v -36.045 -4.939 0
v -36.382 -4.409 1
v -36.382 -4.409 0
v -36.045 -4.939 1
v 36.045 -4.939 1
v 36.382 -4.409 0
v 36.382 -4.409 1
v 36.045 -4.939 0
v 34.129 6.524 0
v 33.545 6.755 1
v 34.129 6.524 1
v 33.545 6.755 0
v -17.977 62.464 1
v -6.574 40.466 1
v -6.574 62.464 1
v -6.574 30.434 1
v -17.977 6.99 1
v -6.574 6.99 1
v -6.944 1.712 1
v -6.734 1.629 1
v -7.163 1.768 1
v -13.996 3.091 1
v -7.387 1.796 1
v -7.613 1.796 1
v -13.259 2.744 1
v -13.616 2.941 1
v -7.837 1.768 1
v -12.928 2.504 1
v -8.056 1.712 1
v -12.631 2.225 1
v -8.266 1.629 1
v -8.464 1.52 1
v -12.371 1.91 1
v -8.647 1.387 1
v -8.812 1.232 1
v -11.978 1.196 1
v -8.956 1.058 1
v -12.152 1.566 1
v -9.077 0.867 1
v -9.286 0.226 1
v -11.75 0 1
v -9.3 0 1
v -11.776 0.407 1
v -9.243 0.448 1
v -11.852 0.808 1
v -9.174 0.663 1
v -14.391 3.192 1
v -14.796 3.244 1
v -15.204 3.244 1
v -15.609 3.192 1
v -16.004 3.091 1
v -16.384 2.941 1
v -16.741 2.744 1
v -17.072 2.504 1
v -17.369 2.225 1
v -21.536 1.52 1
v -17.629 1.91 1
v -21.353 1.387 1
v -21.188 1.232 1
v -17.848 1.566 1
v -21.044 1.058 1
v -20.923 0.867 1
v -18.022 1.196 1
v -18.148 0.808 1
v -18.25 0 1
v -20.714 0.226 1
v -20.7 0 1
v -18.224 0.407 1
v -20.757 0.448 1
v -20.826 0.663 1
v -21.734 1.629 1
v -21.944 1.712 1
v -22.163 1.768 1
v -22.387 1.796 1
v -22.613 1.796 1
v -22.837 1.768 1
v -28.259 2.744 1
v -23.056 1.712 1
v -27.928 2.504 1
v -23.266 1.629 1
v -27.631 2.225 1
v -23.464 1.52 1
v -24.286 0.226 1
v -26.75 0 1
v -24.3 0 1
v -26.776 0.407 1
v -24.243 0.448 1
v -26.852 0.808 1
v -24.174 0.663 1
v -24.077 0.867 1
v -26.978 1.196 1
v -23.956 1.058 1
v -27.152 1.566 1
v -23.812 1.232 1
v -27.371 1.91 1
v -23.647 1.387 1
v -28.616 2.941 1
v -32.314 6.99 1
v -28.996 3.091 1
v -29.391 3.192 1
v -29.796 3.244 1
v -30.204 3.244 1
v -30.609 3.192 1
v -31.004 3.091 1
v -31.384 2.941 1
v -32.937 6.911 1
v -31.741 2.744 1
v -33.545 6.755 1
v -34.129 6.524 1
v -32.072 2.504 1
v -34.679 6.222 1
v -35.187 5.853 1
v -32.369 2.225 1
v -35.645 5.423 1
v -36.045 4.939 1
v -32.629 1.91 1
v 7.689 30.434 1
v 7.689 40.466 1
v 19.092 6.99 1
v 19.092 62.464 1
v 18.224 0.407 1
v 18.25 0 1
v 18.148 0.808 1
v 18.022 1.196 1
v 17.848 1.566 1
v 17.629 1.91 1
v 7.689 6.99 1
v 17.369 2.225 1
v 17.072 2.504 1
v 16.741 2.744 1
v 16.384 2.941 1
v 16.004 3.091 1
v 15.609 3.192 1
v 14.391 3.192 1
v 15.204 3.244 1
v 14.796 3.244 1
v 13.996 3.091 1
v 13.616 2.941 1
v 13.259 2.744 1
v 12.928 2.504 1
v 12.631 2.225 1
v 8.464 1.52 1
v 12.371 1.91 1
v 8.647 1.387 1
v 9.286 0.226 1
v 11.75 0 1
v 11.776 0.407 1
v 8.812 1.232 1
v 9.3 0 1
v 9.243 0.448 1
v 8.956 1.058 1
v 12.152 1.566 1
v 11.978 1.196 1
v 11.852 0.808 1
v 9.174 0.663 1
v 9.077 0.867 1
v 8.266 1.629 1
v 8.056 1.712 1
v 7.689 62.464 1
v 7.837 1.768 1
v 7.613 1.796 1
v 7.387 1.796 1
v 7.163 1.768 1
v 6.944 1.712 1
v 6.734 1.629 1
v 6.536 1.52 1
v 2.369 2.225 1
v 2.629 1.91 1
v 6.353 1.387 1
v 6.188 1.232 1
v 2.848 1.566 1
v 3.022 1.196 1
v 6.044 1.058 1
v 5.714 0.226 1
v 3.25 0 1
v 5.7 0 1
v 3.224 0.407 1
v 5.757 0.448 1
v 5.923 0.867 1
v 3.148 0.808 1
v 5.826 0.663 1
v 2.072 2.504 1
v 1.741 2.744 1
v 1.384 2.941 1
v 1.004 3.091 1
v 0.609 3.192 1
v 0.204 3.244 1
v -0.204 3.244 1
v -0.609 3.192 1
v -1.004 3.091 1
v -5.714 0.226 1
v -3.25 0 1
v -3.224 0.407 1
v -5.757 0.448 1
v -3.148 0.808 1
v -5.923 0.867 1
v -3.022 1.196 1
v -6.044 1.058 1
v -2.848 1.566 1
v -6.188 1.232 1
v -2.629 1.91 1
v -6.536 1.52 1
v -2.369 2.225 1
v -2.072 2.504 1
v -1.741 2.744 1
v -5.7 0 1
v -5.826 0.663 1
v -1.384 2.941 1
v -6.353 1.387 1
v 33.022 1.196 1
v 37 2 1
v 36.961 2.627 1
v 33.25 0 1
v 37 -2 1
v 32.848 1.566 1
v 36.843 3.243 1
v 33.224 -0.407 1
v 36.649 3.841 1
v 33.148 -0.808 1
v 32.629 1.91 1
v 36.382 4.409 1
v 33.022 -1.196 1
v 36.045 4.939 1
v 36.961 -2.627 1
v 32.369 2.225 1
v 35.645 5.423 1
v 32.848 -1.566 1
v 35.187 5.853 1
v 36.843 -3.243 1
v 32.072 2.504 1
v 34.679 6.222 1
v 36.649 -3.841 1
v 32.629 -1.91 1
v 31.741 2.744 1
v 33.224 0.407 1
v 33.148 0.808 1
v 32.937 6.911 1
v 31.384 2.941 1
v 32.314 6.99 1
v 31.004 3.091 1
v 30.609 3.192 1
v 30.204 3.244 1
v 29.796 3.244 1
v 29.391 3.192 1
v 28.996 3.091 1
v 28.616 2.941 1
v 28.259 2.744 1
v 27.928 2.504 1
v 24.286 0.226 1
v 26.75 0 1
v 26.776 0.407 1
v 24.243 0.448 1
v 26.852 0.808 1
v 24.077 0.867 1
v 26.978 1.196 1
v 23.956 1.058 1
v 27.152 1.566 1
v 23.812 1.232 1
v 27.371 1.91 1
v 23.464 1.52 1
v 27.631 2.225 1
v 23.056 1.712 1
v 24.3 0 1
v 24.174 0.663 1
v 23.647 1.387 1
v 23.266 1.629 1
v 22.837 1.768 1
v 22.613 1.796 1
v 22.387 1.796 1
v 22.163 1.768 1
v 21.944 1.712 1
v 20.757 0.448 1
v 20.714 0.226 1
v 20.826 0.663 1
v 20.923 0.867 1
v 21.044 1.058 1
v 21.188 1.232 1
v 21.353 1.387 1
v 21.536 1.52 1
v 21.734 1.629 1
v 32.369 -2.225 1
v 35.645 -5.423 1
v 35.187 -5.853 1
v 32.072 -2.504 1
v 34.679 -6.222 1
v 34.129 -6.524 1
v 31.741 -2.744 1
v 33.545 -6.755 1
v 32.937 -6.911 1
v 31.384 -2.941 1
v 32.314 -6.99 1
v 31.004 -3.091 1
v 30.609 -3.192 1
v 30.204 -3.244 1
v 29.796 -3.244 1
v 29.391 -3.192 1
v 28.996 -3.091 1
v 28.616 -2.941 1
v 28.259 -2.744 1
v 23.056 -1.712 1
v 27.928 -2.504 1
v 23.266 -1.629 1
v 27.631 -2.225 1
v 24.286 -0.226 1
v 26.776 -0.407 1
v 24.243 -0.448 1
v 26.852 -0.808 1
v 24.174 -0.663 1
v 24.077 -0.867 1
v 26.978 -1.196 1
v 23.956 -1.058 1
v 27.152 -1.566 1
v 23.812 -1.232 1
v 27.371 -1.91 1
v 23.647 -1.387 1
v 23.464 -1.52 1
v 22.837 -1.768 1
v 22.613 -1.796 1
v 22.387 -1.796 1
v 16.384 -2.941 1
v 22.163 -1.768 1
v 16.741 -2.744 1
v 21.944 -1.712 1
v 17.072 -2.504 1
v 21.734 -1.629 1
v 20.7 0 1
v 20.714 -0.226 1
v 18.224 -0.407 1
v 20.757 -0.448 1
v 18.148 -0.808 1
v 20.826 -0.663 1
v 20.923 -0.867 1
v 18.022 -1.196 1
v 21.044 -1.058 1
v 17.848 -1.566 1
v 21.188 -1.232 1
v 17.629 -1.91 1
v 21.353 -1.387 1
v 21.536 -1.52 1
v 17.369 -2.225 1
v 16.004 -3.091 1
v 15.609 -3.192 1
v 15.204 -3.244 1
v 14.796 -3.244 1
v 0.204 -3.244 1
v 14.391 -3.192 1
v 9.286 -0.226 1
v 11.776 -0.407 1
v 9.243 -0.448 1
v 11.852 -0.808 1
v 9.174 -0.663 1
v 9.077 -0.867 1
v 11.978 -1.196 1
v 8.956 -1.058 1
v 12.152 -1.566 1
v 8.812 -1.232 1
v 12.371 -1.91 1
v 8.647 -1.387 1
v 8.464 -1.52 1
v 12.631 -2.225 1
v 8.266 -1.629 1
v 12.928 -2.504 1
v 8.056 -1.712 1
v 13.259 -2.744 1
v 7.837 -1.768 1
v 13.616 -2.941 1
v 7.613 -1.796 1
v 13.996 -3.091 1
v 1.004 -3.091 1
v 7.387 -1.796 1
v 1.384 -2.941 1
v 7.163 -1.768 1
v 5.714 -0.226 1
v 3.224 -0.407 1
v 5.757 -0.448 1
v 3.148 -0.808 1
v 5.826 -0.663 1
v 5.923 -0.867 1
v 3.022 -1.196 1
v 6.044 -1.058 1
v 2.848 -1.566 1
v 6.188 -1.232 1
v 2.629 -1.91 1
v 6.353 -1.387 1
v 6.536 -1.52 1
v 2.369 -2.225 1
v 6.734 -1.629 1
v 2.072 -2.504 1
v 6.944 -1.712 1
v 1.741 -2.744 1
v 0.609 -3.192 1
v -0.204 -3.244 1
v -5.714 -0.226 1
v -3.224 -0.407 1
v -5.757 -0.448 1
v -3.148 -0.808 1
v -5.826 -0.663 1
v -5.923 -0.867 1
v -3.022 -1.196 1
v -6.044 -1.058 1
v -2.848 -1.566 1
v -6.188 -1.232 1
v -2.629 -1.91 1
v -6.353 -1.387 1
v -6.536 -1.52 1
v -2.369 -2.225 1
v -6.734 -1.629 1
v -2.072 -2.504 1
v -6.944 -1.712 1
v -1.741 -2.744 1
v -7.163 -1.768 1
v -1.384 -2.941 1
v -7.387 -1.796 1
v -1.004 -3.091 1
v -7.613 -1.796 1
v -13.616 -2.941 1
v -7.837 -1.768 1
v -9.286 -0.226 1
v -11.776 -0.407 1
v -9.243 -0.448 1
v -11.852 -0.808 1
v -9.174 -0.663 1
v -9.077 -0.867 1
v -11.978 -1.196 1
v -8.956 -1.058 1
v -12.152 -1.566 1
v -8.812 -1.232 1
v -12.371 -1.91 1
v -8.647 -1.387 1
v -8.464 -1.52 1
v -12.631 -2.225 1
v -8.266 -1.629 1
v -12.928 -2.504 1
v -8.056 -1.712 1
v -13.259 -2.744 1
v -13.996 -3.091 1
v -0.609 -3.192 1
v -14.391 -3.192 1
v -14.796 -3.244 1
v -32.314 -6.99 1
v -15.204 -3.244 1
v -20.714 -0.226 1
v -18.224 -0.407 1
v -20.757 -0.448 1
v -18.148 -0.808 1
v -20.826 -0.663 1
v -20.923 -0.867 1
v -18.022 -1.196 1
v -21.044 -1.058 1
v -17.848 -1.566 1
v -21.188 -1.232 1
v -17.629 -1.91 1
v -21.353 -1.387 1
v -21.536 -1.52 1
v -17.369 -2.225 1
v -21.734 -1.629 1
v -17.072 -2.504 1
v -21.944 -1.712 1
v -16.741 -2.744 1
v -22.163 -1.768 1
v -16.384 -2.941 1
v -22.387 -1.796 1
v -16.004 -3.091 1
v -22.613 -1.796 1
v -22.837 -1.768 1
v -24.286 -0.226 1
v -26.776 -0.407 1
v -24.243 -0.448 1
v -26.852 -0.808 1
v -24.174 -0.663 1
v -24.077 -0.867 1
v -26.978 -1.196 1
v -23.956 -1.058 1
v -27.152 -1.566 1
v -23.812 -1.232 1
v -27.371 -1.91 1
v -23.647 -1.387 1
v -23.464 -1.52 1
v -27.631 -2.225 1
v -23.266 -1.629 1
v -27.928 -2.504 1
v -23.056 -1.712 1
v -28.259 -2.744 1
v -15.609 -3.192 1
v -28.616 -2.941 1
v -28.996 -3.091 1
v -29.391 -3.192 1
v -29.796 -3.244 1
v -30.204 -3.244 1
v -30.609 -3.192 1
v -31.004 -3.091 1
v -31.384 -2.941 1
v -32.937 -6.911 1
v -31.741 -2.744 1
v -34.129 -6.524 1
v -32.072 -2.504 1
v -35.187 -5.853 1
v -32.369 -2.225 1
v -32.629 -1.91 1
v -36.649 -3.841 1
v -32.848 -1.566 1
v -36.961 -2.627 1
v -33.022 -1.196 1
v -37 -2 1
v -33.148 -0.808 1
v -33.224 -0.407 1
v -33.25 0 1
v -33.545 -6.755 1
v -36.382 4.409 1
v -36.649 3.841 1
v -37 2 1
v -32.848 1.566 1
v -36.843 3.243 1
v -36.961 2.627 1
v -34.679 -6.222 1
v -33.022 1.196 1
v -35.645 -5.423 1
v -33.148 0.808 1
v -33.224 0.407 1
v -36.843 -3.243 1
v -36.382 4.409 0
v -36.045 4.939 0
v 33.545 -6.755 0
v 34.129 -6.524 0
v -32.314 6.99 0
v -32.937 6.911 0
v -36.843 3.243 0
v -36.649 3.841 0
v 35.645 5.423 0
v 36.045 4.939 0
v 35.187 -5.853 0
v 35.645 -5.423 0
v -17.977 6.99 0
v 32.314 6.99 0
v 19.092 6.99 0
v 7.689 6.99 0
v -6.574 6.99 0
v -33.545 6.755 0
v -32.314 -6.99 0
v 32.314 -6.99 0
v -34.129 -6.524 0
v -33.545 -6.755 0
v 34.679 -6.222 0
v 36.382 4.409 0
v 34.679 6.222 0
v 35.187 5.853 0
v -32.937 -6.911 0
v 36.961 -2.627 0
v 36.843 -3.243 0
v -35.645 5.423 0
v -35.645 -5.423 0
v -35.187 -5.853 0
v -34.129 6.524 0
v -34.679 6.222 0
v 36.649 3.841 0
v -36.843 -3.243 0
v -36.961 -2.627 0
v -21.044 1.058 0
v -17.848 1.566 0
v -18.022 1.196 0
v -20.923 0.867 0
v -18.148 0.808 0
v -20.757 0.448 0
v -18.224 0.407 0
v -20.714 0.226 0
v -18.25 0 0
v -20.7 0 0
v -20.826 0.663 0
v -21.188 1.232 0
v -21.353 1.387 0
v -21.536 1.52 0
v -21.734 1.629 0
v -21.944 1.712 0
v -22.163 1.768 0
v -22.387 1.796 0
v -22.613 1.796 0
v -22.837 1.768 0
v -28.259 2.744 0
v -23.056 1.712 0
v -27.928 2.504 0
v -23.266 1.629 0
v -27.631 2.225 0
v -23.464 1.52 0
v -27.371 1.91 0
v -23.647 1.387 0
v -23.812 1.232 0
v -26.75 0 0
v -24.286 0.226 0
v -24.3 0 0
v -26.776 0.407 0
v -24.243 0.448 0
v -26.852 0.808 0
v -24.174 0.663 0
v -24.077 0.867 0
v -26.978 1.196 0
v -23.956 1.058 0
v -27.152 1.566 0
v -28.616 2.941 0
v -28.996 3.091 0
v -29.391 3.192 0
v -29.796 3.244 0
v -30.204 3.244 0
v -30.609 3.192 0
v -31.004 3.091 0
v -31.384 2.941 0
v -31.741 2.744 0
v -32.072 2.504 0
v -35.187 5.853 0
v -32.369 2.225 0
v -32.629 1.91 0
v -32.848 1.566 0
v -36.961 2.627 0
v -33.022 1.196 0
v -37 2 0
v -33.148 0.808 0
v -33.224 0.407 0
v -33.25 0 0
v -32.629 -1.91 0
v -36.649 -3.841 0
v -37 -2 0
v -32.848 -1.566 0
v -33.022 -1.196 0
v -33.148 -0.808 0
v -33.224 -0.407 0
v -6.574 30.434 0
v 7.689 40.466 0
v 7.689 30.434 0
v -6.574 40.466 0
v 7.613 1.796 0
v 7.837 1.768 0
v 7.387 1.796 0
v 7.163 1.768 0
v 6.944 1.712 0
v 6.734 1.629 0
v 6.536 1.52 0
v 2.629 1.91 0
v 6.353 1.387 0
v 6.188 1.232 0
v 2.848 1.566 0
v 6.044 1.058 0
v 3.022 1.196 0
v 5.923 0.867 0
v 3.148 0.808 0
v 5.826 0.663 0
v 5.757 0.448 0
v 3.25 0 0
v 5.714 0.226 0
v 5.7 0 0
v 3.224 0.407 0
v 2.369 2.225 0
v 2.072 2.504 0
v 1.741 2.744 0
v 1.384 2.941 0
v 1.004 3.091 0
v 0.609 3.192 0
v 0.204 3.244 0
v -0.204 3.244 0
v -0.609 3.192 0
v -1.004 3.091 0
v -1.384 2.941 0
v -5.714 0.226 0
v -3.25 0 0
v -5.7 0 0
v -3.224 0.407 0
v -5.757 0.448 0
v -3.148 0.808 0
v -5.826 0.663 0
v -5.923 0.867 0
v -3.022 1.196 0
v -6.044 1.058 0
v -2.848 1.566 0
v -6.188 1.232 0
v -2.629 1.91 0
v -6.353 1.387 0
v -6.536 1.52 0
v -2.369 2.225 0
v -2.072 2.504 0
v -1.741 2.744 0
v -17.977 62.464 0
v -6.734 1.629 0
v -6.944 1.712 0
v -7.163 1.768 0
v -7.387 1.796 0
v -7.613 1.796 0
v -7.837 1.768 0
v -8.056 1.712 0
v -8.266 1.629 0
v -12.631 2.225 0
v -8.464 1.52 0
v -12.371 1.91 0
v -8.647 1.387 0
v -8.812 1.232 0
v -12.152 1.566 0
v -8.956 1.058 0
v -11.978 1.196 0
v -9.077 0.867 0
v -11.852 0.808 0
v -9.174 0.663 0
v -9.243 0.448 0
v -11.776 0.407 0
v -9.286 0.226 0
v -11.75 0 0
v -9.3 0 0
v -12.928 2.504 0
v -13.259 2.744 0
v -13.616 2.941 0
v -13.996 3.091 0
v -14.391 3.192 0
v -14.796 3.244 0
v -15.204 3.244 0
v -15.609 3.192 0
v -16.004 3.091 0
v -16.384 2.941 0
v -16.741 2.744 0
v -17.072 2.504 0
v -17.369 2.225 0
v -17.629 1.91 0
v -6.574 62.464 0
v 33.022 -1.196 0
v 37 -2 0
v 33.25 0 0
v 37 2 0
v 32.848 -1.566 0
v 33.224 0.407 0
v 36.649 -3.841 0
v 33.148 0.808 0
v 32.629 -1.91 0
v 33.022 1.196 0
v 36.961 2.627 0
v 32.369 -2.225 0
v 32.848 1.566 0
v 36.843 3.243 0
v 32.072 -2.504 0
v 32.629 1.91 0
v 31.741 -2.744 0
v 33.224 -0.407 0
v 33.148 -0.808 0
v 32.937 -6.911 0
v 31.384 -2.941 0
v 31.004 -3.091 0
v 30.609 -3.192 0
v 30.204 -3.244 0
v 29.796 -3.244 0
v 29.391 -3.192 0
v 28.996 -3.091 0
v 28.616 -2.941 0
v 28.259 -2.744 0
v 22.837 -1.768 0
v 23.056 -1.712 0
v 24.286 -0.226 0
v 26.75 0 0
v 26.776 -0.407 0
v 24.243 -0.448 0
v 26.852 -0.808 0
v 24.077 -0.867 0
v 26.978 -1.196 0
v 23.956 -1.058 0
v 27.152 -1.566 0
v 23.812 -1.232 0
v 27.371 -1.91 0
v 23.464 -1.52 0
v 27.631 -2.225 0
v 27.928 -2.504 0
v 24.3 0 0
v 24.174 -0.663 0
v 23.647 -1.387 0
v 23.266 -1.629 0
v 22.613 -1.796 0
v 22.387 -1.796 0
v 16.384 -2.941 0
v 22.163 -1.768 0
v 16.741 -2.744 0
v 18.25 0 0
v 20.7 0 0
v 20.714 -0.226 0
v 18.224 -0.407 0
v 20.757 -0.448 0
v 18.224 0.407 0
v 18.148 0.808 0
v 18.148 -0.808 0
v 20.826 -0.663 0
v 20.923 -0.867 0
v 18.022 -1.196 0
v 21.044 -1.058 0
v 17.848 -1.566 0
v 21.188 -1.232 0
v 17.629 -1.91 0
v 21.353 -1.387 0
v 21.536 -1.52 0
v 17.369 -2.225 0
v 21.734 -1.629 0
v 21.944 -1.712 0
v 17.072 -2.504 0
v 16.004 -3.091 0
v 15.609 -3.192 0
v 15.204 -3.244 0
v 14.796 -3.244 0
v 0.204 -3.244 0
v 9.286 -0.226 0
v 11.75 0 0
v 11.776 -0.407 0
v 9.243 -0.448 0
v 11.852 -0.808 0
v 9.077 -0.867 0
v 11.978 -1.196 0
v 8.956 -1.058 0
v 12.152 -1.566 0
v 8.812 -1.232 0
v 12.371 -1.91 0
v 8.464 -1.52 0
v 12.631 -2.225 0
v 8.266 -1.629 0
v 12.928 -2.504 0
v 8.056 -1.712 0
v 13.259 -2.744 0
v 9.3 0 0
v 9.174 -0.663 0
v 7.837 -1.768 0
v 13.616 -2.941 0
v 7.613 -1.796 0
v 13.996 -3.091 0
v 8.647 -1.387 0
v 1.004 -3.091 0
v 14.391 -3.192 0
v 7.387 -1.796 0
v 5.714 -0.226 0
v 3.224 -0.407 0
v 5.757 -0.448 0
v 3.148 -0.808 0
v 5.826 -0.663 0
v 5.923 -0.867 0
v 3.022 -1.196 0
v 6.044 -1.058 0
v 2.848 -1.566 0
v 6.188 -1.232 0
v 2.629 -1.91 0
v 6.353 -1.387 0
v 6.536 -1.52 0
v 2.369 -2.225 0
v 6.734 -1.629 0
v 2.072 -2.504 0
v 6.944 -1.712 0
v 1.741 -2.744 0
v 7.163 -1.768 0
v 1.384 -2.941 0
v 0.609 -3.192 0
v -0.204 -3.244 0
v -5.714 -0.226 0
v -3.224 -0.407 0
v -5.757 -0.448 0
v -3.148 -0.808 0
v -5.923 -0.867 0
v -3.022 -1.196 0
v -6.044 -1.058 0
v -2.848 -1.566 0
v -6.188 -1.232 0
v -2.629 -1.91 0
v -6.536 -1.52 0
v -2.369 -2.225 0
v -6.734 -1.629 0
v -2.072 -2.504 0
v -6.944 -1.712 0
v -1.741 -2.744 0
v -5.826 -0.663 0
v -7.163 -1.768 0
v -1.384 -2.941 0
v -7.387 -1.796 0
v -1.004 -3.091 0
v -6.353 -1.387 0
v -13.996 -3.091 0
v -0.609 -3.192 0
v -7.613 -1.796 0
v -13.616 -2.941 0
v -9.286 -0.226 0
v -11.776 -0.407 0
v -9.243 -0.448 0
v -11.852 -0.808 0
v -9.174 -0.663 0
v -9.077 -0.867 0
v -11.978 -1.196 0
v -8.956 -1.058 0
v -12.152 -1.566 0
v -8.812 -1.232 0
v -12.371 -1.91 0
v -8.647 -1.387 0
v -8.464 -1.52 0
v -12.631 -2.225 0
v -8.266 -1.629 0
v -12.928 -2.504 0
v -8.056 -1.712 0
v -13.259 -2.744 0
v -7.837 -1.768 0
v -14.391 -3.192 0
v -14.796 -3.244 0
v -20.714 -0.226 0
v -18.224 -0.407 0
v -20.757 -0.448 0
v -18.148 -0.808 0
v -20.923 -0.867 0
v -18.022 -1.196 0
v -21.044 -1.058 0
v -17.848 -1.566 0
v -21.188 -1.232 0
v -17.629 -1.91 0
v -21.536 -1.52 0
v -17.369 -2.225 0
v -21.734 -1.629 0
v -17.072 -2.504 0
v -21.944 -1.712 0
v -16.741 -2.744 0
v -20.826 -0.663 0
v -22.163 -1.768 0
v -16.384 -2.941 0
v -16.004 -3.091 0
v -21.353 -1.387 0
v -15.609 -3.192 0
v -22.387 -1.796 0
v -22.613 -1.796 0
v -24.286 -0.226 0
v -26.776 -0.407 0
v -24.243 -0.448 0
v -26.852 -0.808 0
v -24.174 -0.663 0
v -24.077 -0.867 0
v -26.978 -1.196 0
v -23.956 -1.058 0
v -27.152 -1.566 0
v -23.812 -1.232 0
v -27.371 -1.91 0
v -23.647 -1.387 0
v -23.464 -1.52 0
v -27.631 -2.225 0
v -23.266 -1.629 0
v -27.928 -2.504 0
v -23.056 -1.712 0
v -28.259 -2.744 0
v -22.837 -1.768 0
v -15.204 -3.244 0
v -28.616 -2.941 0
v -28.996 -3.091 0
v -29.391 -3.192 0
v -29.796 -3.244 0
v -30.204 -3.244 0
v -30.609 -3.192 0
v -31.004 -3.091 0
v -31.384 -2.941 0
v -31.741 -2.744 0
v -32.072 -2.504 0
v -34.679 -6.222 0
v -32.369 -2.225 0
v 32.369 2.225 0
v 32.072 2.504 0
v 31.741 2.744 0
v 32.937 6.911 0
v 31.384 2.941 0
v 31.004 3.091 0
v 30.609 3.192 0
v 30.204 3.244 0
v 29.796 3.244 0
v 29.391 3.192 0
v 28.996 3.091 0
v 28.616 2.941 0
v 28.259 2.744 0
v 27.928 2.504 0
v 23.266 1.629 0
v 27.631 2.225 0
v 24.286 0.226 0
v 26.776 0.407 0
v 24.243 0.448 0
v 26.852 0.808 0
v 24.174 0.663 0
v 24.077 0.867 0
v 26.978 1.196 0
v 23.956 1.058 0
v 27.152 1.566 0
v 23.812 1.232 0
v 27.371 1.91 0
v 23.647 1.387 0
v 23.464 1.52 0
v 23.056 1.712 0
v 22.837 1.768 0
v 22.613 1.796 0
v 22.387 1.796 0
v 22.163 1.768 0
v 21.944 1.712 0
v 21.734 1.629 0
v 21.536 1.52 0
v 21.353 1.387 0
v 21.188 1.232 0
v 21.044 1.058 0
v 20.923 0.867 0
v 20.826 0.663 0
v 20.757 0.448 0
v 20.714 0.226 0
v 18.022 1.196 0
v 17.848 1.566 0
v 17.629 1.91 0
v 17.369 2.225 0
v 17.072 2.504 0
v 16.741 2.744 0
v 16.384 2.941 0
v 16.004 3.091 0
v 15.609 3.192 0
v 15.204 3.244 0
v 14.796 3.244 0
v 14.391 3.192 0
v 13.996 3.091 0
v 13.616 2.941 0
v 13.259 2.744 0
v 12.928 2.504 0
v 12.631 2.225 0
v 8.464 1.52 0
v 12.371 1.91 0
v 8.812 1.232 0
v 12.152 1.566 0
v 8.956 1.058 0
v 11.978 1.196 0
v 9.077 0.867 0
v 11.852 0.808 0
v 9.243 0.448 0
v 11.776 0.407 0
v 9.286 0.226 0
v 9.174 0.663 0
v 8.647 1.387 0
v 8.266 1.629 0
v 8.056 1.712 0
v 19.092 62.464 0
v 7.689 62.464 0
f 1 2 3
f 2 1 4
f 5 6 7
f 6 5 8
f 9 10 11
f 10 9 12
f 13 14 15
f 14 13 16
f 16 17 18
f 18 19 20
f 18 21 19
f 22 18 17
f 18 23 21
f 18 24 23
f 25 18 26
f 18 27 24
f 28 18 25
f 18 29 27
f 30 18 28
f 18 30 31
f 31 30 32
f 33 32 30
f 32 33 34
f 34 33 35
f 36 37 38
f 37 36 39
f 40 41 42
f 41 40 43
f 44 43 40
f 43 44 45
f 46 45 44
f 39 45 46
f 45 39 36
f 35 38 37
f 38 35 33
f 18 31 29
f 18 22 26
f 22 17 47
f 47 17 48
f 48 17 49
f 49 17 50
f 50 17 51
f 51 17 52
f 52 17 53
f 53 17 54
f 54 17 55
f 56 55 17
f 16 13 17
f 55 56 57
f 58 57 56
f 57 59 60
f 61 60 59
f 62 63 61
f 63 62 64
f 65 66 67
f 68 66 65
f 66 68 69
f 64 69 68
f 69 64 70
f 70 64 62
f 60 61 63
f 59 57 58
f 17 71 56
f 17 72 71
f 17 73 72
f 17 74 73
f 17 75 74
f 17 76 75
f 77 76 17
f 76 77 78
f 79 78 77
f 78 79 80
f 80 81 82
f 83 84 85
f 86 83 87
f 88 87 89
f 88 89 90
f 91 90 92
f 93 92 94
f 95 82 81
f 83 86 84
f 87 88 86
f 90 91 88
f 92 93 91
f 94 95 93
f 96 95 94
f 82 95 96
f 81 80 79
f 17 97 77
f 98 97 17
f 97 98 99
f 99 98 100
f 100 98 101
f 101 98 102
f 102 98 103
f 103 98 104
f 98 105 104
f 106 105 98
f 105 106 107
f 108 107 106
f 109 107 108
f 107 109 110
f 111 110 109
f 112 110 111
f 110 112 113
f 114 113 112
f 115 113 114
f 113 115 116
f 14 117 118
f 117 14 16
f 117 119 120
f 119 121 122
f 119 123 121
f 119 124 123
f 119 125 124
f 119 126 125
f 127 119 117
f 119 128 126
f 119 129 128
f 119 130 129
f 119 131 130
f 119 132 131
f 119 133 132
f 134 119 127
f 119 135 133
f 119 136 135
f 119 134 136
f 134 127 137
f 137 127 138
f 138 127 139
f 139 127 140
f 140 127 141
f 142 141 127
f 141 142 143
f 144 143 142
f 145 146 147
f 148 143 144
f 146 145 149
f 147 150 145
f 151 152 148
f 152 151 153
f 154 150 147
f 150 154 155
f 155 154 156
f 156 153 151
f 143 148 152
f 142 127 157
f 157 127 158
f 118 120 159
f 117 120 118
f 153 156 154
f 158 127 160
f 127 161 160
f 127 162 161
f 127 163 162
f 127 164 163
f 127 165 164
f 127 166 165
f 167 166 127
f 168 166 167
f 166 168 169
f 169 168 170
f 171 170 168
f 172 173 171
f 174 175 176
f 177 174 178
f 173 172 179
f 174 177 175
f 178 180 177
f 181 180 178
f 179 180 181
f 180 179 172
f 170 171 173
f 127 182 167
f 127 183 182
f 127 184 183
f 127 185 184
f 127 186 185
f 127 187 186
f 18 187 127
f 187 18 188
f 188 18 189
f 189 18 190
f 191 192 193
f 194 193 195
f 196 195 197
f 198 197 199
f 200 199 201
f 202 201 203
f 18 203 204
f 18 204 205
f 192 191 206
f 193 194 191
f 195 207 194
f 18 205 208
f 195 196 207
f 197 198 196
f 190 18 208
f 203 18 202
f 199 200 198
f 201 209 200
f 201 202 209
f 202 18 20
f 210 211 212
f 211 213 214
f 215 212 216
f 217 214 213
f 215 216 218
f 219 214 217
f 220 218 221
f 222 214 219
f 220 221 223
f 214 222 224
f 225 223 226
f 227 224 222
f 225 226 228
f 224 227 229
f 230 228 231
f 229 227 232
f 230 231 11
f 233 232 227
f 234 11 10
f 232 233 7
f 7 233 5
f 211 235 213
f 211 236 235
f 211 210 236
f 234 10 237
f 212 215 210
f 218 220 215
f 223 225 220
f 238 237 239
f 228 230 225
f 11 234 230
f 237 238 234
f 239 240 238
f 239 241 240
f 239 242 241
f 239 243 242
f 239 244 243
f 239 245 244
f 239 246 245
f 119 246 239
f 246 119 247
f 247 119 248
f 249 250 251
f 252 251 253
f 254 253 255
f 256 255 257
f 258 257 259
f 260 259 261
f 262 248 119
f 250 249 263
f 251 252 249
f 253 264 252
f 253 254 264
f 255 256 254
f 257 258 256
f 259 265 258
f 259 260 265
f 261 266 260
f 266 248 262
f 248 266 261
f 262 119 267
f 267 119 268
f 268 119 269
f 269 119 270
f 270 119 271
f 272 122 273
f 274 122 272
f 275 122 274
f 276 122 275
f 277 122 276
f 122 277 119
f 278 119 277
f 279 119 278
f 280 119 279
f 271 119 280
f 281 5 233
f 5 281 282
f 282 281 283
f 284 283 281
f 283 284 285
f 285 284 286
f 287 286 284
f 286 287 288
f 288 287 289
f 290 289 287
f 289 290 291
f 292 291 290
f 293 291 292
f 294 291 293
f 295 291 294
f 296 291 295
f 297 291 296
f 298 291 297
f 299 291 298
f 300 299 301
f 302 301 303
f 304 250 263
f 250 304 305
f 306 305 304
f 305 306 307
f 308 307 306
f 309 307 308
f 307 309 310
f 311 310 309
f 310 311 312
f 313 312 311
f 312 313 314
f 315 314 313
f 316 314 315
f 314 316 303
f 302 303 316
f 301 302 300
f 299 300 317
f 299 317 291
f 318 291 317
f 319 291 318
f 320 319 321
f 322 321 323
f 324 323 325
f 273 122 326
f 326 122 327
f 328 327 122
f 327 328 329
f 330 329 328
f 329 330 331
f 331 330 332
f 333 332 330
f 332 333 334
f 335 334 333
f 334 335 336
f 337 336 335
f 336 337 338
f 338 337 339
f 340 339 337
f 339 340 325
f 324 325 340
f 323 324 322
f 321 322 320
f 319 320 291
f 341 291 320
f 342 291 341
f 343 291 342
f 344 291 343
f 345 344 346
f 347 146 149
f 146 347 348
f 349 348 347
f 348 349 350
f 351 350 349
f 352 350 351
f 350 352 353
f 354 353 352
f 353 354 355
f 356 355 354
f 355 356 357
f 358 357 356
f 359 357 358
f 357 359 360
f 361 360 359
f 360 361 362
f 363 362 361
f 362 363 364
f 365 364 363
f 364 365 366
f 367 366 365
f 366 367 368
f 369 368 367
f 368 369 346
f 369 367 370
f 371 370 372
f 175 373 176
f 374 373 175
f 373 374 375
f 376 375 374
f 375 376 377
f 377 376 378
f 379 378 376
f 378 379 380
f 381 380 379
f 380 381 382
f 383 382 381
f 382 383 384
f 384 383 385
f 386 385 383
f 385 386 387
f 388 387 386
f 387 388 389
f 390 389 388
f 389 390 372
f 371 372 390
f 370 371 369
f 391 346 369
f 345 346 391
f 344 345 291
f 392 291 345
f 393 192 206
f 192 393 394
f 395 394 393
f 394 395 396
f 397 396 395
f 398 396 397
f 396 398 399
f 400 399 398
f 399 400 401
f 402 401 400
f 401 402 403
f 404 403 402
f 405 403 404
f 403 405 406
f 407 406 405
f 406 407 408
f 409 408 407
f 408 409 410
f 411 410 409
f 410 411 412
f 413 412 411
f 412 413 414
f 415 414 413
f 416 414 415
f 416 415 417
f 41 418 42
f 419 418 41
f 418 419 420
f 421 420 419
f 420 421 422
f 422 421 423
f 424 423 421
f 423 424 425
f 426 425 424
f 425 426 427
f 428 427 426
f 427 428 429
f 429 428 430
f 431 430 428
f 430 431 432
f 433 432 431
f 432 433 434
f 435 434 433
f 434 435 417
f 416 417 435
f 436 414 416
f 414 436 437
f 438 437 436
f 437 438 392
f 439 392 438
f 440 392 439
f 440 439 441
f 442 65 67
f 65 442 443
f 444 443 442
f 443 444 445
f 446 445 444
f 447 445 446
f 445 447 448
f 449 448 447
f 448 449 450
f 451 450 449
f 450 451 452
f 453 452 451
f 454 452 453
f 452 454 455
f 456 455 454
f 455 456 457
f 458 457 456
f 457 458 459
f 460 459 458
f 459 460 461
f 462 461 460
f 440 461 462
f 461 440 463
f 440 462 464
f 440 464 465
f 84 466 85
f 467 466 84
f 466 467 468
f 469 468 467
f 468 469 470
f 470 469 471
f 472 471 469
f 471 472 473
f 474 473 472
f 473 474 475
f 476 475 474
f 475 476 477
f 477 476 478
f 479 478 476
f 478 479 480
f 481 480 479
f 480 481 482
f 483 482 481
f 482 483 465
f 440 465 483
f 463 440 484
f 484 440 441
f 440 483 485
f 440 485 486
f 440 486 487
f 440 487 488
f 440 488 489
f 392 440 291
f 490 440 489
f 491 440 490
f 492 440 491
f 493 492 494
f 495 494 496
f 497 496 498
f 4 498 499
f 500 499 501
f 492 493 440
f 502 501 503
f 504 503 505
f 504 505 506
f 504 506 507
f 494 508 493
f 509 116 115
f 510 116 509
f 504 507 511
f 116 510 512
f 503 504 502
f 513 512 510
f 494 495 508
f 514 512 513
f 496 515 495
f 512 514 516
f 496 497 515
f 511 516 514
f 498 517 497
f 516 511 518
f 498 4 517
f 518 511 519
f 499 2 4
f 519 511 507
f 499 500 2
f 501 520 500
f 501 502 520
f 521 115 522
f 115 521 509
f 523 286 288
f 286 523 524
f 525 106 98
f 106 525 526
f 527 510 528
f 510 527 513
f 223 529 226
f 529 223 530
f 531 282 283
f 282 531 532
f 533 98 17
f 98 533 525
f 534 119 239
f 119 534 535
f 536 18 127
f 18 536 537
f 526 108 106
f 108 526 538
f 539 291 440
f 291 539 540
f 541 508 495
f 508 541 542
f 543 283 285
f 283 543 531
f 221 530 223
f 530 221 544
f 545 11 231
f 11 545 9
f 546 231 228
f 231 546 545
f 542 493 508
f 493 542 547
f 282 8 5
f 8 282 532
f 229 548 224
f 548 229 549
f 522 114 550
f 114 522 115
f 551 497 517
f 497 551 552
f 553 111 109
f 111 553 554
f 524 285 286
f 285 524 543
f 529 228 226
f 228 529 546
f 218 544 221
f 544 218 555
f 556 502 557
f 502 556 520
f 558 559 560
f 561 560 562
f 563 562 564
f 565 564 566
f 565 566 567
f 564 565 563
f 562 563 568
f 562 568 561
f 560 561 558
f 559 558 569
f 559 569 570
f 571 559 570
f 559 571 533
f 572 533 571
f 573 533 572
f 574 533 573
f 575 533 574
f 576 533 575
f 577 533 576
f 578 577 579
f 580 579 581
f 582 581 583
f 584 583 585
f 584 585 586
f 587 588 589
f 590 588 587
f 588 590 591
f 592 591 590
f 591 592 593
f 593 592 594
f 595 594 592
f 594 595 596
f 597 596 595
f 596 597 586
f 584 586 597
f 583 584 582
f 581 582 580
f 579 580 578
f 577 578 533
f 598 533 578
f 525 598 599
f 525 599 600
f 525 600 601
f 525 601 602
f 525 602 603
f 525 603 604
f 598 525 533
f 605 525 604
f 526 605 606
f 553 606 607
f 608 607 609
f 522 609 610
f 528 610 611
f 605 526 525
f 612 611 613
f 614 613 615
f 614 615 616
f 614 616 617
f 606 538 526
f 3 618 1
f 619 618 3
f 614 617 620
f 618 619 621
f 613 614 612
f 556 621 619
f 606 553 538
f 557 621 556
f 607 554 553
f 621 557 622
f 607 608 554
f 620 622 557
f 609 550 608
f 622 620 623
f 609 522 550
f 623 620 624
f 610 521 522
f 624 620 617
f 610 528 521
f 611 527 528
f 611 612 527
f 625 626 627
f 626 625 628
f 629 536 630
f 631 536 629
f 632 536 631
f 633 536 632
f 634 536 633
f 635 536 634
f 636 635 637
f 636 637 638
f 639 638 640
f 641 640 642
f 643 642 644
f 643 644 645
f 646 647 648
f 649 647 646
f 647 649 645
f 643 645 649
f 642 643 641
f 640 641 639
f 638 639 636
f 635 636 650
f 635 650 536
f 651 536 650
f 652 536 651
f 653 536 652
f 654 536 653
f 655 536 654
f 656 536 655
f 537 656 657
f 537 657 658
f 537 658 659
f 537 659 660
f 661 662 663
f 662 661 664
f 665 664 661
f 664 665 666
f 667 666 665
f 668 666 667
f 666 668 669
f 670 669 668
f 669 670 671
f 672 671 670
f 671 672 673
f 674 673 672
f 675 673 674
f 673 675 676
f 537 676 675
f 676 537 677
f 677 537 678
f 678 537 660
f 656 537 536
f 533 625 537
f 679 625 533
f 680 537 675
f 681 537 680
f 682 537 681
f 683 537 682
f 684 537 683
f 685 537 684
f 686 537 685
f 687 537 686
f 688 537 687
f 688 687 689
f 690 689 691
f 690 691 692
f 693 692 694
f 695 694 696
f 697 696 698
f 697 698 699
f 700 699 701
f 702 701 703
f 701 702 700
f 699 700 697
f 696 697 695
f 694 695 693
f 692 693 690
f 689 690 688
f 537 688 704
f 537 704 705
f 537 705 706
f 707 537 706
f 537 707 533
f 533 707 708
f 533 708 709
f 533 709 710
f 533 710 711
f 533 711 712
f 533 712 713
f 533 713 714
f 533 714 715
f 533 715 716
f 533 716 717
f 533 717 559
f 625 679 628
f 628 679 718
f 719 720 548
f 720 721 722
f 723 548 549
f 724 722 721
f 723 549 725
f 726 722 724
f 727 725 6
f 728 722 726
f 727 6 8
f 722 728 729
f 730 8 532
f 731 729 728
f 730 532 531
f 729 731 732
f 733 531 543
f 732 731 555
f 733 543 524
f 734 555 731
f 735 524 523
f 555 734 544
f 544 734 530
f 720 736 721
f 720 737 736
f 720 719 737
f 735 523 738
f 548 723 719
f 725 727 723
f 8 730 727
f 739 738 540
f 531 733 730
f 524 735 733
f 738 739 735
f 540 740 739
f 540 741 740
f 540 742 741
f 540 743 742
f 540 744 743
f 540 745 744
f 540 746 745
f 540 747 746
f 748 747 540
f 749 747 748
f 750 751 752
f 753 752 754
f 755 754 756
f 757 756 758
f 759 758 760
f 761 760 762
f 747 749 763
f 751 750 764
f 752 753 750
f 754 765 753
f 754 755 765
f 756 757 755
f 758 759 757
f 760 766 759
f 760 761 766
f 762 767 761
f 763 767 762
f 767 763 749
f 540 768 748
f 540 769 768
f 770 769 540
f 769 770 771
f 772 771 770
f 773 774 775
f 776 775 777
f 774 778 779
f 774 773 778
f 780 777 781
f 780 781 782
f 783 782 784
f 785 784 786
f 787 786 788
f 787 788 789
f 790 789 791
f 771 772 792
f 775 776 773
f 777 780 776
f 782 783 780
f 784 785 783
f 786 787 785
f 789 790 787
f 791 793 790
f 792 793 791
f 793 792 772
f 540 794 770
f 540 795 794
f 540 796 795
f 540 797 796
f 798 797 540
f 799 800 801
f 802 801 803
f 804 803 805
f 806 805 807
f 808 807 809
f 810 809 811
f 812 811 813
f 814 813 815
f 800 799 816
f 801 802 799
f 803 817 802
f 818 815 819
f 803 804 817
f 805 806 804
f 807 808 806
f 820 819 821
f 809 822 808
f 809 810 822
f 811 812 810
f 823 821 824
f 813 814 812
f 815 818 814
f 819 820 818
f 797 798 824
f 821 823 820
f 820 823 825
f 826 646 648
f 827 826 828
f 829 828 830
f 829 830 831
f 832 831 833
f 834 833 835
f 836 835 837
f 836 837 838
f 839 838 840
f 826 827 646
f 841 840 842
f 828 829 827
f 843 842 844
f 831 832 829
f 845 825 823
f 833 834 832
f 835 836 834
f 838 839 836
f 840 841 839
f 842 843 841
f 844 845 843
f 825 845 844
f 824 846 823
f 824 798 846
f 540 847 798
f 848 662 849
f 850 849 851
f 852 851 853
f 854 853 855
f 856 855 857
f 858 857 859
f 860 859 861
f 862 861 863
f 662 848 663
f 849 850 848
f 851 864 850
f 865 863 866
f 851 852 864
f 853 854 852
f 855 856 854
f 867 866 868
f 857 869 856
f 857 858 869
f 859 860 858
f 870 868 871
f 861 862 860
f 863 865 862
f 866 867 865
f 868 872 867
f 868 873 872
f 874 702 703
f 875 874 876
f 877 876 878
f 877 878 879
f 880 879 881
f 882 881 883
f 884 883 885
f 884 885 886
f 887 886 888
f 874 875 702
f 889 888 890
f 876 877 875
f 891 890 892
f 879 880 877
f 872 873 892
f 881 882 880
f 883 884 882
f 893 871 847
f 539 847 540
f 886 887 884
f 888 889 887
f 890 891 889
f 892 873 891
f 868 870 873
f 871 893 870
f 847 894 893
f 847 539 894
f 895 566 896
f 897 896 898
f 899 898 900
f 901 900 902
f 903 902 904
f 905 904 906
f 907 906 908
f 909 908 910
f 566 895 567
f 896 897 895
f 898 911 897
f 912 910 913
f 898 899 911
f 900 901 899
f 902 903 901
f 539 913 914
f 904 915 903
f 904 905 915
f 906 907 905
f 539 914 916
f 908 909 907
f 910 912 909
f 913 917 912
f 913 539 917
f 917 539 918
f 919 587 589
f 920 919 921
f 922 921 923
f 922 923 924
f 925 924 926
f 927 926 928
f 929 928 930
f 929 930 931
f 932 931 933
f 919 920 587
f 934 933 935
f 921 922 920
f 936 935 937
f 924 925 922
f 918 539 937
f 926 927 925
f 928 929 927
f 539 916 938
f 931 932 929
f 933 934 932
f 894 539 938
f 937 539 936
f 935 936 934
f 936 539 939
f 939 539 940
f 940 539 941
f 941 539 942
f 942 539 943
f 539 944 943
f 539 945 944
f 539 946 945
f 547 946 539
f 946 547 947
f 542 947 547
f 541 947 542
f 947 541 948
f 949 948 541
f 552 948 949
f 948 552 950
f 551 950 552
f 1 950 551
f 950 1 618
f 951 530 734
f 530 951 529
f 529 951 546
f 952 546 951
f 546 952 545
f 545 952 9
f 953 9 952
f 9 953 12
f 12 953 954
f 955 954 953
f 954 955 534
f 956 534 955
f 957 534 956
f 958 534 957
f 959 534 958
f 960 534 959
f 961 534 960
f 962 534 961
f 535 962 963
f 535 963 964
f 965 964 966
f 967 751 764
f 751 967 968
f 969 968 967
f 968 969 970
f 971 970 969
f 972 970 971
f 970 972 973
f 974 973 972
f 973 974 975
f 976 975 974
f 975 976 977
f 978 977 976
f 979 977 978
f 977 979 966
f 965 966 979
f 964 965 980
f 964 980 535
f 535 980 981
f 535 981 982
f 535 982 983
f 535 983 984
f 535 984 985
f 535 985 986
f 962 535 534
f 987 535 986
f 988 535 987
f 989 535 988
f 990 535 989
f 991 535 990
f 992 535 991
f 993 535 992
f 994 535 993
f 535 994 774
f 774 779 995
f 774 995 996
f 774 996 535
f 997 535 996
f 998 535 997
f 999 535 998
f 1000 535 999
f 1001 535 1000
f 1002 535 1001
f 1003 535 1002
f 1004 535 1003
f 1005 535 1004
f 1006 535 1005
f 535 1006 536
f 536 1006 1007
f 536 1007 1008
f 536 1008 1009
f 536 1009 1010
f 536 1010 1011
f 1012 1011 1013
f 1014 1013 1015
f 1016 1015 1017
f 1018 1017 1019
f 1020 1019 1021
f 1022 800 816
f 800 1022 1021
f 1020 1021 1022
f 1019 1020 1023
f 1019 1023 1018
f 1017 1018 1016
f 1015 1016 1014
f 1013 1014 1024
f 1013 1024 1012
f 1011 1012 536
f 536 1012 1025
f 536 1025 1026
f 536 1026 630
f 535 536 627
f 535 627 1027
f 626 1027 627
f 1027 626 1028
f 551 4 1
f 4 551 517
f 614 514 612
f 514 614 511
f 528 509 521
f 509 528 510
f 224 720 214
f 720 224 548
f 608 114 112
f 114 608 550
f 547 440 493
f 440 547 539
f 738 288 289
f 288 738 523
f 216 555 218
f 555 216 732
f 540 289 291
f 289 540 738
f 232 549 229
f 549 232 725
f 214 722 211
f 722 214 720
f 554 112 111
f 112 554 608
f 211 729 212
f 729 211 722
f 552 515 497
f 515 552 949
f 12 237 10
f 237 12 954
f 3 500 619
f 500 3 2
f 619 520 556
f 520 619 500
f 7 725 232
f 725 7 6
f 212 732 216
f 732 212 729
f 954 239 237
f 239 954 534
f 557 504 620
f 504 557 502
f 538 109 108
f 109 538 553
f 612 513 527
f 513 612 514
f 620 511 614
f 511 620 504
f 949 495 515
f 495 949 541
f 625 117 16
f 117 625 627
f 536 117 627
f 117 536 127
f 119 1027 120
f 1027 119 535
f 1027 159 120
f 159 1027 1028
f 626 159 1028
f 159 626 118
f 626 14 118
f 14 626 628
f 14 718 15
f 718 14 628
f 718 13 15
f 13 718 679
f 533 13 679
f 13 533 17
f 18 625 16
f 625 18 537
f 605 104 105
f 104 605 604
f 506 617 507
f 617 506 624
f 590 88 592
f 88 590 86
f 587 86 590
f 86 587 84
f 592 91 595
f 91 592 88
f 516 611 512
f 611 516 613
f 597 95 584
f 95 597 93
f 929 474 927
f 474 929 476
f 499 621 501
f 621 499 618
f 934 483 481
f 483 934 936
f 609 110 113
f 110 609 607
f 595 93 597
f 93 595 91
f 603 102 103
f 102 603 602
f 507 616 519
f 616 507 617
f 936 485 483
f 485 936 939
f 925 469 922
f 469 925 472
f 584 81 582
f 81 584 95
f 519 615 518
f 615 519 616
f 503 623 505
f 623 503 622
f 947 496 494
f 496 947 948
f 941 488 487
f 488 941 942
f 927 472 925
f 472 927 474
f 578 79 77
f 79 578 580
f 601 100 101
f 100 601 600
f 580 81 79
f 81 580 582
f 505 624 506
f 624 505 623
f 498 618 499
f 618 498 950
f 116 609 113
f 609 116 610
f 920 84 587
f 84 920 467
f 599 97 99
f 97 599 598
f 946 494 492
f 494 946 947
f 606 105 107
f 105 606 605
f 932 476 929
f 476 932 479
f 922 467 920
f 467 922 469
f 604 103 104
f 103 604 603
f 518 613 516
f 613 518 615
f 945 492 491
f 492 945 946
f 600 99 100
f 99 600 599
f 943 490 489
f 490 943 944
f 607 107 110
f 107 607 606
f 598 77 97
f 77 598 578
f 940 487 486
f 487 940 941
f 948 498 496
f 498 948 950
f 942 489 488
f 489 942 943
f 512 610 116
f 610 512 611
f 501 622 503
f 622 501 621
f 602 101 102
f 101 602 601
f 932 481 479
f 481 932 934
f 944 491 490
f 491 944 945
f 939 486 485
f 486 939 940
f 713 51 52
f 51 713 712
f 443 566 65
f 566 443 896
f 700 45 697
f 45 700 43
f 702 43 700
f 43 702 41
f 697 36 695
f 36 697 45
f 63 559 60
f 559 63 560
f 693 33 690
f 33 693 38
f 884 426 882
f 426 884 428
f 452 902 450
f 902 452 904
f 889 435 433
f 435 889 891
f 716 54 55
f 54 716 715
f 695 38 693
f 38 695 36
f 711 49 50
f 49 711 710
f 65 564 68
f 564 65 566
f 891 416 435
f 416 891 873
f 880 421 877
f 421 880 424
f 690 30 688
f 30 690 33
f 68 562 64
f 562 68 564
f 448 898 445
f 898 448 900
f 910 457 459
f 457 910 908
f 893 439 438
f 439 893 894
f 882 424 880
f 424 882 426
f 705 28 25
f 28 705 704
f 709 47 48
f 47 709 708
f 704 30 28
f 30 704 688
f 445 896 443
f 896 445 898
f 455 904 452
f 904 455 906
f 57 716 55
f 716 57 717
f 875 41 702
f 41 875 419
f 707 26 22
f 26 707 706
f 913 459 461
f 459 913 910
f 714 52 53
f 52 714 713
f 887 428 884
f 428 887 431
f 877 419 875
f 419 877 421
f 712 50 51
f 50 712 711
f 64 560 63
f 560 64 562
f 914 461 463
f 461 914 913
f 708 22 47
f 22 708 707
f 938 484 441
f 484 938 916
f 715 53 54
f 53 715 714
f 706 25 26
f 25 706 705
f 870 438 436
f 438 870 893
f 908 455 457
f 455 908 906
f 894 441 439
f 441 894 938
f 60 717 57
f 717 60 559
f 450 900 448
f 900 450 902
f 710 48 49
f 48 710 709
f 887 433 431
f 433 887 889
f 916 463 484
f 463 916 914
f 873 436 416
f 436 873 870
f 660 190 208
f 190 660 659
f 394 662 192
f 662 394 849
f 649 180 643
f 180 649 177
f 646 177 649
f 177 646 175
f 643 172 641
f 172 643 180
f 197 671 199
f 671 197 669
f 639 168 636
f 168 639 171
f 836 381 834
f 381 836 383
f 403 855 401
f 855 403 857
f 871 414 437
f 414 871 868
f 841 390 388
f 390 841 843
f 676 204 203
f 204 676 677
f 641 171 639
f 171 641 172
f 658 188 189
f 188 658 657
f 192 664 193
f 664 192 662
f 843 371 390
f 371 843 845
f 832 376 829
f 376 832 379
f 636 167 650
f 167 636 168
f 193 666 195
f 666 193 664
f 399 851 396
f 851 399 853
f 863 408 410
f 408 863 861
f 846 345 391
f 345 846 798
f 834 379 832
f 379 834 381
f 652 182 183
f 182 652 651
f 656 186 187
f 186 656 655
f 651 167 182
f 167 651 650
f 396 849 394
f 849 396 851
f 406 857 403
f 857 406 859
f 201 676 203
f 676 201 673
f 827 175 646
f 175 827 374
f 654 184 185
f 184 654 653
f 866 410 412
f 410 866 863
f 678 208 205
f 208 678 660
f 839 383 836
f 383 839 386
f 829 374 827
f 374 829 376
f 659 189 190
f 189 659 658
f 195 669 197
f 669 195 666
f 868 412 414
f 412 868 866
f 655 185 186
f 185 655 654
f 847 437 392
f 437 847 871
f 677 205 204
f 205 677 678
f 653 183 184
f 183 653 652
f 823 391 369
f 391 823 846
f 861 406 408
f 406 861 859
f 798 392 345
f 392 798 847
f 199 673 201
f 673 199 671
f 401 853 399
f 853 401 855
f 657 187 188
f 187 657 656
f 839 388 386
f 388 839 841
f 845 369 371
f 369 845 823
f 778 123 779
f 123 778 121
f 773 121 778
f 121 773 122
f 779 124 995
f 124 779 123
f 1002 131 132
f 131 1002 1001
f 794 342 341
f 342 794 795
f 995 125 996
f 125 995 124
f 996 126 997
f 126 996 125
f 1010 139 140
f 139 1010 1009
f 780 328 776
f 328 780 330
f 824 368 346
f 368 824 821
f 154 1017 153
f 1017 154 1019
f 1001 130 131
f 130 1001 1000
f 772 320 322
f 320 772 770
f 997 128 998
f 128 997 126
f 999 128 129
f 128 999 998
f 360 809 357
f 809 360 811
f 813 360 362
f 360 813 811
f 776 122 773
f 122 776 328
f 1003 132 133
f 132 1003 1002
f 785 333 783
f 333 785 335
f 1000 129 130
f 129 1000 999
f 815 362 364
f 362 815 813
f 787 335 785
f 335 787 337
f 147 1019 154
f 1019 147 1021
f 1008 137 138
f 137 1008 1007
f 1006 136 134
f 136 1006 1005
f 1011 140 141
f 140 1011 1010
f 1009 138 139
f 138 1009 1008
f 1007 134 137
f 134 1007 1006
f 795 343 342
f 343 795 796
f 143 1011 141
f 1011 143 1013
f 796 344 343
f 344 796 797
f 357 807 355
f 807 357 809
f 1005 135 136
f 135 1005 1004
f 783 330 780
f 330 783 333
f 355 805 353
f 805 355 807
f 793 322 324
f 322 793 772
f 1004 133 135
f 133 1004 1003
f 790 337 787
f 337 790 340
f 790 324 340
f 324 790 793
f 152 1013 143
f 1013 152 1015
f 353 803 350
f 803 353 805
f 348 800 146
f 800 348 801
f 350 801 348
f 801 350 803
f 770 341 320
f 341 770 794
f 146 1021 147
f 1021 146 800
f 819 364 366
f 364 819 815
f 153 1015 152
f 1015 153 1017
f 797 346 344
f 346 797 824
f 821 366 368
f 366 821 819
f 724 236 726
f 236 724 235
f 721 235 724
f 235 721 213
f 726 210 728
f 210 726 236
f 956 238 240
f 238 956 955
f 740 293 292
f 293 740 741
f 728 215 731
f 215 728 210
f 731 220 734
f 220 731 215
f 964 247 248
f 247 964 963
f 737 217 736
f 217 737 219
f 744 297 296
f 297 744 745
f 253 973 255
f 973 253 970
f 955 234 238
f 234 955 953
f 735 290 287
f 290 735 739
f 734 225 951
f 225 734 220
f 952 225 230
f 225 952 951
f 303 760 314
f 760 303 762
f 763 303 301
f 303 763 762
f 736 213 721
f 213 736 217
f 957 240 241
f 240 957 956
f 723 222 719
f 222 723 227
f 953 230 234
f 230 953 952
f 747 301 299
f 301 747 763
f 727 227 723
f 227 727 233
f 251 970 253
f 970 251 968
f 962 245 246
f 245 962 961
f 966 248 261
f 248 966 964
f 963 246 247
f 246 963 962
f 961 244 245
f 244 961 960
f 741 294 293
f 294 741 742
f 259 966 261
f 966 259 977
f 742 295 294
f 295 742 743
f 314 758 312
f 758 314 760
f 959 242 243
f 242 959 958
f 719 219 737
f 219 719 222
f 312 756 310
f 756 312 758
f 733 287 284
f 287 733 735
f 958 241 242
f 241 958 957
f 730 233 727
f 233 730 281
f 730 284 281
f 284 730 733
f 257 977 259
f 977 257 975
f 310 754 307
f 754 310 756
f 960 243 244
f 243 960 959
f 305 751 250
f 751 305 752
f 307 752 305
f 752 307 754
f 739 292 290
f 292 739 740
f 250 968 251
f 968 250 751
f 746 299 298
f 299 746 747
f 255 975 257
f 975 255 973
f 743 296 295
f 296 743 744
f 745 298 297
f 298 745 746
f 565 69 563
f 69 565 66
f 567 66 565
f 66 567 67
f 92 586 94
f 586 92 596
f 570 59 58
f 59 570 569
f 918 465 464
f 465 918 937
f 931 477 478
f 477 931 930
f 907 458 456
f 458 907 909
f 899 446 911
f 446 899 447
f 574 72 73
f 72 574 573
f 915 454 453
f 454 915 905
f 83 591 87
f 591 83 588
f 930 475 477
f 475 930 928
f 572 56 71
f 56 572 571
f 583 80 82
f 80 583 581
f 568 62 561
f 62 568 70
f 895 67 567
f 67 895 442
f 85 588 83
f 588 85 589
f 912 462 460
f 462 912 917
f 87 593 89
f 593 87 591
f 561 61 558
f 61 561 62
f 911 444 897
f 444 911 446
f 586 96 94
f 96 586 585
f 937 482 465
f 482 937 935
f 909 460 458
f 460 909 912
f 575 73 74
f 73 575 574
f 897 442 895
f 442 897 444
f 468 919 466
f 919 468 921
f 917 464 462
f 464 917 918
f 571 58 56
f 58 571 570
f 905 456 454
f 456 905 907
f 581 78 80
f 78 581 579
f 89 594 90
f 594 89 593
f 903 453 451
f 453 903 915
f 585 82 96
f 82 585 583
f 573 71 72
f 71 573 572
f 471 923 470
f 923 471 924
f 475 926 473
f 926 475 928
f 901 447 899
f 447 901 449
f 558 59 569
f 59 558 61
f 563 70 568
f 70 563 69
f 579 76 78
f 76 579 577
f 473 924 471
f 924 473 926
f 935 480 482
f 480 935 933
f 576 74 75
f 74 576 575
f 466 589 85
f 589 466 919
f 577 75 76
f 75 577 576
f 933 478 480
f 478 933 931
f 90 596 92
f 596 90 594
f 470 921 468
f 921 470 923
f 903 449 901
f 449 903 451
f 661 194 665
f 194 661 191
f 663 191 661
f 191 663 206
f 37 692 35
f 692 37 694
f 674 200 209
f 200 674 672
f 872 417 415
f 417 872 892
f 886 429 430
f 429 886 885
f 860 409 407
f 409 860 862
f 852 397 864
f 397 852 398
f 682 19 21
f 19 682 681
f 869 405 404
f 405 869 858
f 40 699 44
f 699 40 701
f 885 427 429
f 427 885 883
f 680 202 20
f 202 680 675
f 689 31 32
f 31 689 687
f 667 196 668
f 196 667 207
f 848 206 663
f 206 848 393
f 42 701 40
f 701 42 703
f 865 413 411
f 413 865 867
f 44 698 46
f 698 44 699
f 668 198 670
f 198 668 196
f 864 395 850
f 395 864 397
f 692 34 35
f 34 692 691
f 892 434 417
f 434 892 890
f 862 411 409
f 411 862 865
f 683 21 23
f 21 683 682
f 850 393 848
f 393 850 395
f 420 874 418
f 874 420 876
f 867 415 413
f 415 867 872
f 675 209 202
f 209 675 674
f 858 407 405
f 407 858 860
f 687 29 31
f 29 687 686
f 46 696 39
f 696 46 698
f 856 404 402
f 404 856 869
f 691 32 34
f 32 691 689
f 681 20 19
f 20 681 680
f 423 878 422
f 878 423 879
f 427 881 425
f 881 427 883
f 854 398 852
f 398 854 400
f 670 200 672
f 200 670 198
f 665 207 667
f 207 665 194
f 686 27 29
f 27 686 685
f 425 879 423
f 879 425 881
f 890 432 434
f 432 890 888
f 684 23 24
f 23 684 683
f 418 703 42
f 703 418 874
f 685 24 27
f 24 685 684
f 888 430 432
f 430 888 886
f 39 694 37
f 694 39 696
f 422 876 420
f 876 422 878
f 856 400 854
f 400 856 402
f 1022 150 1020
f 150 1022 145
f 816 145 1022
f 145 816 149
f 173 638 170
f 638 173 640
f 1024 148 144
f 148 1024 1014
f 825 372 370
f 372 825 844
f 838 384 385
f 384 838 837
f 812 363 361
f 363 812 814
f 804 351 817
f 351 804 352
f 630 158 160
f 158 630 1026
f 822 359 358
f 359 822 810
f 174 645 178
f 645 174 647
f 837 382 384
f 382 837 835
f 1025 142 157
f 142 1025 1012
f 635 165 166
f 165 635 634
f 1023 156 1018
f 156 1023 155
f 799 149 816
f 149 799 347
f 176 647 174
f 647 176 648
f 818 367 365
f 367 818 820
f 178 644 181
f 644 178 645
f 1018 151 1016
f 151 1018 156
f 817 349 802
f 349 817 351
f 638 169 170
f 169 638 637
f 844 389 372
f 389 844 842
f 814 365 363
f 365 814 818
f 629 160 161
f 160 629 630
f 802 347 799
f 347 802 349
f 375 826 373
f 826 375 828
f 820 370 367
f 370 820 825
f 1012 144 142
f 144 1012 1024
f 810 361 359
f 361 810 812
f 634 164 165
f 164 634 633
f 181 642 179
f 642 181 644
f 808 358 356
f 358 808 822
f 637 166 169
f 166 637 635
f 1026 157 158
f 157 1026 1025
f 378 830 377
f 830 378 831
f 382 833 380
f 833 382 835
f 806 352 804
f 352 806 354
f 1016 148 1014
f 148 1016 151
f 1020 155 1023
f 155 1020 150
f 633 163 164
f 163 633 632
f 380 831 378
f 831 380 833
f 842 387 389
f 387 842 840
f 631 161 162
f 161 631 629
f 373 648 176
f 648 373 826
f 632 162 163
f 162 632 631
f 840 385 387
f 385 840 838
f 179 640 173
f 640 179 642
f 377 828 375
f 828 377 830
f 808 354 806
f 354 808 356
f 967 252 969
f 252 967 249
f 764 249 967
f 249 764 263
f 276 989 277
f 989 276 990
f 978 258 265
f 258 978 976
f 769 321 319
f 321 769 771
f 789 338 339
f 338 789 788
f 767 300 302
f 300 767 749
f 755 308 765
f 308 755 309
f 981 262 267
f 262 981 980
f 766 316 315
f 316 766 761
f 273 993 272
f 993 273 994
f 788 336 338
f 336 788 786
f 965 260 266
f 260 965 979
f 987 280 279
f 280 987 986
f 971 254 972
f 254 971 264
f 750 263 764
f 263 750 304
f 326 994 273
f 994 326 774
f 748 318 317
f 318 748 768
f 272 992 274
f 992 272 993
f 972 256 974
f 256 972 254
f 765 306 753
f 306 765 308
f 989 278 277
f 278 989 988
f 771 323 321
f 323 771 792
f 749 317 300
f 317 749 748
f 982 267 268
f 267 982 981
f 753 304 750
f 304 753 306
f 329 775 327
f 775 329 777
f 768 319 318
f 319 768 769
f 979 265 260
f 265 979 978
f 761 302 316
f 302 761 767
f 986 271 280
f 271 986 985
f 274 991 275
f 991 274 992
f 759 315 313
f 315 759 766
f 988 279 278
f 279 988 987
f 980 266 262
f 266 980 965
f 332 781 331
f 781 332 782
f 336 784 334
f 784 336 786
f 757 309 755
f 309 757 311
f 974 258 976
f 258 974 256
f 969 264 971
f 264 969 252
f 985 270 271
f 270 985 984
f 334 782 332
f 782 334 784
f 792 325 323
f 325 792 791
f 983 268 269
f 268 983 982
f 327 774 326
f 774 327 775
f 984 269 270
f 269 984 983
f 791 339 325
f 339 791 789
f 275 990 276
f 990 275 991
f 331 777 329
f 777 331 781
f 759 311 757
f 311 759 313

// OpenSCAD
$fn = 50;


difference() {
	union() {
		hull() {
			translate(v = [-32.0000000000, 2.0000000000, 0]) {
				cylinder(h = 1, r = 5);
			}
			translate(v = [32.0000000000, 2.0000000000, 0]) {
				cylinder(h = 1, r = 5);
			}
			translate(v = [-32.0000000000, -2.0000000000, 0]) {
				cylinder(h = 1, r = 5);
			}
			translate(v = [32.0000000000, -2.0000000000, 0]) {
				cylinder(h = 1, r = 5);
			}
		}
		translate(v = [0, 61.1111111111, 0]) {
			linear_extrude(height = 1) {
				text(font = "DejaVu Sans Mono:style=Bold", halign = "center", size = 57.0000000000, text = "H", valign = "top");
			}
		}
	}
	union() {
		translate(v = [-30.0000000000, 0.0000000000, 0]) {
			translate(v = [0, 0, -100]) {
				cylinder(h = 200, r = 3.2500000000);
			}
		}
		translate(v = [-15.0000000000, 0.0000000000, 0]) {
			translate(v = [0, 0, -100]) {
				cylinder(h = 200, r = 3.2500000000);
			}
		}
		translate(v = [0, 0, -100]) {
			cylinder(h = 200, r = 3.2500000000);
		}
		translate(v = [15.0000000000, 0.0000000000, 0]) {
			translate(v = [0, 0, -100]) {
				cylinder(h = 200, r = 3.2500000000);
			}
		}
		translate(v = [30.0000000000, 0.0000000000, 0]) {
			translate(v = [0, 0, -100]) {
				cylinder(h = 200, r = 3.2500000000);
			}
		}
		translate(v = [-30.0000000000, 0.0000000000, 0]) {
			translate(v = [0, 0, -100]) {
				cylinder(h = 200, r = 1.8000000000);
			}
		}
		translate(v = [-22.5000000000, 0.0000000000, 0]) {
			translate(v = [0, 0, -100]) {
				cylinder(h = 200, r = 1.8000000000);
			}
		}
		translate(v = [-15.0000000000, 0.0000000000, 0]) {
			translate(v = [0, 0, -100]) {
				cylinder(h = 200, r = 1.8000000000);
			}
		}
		translate(v = [-7.5000000000, 0.0000000000, 0]) {
			translate(v = [0, 0, -100]) {
				cylinder(h = 200, r = 1.8000000000);
			}
		}
		translate(v = [0, 0, -100]) {
			cylinder(h = 200, r = 1.8000000000);
		}
		translate(v = [7.5000000000, 0.0000000000, 0]) {
			translate(v = [0, 0, -100]) {
				cylinder(h = 200, r = 1.8000000000);
			}
		}
		translate(v = [15.0000000000, 0.0000000000, 0]) {
			translate(v = [0, 0, -100]) {
				cylinder(h = 200, r = 1.8000000000);
			}
		}
		translate(v = [22.5000000000, 0.0000000000, 0]) {
			translate(v = [0, 0, -100]) {
				cylinder(h = 200, r = 1.8000000000);
			}
		}
		translate(v = [30.0000000000, 0.0000000000, 0]) {
			translate(v = [0, 0, -100]) {
				cylinder(h = 200, r = 1.8000000000);
			}
		}
	}
}
